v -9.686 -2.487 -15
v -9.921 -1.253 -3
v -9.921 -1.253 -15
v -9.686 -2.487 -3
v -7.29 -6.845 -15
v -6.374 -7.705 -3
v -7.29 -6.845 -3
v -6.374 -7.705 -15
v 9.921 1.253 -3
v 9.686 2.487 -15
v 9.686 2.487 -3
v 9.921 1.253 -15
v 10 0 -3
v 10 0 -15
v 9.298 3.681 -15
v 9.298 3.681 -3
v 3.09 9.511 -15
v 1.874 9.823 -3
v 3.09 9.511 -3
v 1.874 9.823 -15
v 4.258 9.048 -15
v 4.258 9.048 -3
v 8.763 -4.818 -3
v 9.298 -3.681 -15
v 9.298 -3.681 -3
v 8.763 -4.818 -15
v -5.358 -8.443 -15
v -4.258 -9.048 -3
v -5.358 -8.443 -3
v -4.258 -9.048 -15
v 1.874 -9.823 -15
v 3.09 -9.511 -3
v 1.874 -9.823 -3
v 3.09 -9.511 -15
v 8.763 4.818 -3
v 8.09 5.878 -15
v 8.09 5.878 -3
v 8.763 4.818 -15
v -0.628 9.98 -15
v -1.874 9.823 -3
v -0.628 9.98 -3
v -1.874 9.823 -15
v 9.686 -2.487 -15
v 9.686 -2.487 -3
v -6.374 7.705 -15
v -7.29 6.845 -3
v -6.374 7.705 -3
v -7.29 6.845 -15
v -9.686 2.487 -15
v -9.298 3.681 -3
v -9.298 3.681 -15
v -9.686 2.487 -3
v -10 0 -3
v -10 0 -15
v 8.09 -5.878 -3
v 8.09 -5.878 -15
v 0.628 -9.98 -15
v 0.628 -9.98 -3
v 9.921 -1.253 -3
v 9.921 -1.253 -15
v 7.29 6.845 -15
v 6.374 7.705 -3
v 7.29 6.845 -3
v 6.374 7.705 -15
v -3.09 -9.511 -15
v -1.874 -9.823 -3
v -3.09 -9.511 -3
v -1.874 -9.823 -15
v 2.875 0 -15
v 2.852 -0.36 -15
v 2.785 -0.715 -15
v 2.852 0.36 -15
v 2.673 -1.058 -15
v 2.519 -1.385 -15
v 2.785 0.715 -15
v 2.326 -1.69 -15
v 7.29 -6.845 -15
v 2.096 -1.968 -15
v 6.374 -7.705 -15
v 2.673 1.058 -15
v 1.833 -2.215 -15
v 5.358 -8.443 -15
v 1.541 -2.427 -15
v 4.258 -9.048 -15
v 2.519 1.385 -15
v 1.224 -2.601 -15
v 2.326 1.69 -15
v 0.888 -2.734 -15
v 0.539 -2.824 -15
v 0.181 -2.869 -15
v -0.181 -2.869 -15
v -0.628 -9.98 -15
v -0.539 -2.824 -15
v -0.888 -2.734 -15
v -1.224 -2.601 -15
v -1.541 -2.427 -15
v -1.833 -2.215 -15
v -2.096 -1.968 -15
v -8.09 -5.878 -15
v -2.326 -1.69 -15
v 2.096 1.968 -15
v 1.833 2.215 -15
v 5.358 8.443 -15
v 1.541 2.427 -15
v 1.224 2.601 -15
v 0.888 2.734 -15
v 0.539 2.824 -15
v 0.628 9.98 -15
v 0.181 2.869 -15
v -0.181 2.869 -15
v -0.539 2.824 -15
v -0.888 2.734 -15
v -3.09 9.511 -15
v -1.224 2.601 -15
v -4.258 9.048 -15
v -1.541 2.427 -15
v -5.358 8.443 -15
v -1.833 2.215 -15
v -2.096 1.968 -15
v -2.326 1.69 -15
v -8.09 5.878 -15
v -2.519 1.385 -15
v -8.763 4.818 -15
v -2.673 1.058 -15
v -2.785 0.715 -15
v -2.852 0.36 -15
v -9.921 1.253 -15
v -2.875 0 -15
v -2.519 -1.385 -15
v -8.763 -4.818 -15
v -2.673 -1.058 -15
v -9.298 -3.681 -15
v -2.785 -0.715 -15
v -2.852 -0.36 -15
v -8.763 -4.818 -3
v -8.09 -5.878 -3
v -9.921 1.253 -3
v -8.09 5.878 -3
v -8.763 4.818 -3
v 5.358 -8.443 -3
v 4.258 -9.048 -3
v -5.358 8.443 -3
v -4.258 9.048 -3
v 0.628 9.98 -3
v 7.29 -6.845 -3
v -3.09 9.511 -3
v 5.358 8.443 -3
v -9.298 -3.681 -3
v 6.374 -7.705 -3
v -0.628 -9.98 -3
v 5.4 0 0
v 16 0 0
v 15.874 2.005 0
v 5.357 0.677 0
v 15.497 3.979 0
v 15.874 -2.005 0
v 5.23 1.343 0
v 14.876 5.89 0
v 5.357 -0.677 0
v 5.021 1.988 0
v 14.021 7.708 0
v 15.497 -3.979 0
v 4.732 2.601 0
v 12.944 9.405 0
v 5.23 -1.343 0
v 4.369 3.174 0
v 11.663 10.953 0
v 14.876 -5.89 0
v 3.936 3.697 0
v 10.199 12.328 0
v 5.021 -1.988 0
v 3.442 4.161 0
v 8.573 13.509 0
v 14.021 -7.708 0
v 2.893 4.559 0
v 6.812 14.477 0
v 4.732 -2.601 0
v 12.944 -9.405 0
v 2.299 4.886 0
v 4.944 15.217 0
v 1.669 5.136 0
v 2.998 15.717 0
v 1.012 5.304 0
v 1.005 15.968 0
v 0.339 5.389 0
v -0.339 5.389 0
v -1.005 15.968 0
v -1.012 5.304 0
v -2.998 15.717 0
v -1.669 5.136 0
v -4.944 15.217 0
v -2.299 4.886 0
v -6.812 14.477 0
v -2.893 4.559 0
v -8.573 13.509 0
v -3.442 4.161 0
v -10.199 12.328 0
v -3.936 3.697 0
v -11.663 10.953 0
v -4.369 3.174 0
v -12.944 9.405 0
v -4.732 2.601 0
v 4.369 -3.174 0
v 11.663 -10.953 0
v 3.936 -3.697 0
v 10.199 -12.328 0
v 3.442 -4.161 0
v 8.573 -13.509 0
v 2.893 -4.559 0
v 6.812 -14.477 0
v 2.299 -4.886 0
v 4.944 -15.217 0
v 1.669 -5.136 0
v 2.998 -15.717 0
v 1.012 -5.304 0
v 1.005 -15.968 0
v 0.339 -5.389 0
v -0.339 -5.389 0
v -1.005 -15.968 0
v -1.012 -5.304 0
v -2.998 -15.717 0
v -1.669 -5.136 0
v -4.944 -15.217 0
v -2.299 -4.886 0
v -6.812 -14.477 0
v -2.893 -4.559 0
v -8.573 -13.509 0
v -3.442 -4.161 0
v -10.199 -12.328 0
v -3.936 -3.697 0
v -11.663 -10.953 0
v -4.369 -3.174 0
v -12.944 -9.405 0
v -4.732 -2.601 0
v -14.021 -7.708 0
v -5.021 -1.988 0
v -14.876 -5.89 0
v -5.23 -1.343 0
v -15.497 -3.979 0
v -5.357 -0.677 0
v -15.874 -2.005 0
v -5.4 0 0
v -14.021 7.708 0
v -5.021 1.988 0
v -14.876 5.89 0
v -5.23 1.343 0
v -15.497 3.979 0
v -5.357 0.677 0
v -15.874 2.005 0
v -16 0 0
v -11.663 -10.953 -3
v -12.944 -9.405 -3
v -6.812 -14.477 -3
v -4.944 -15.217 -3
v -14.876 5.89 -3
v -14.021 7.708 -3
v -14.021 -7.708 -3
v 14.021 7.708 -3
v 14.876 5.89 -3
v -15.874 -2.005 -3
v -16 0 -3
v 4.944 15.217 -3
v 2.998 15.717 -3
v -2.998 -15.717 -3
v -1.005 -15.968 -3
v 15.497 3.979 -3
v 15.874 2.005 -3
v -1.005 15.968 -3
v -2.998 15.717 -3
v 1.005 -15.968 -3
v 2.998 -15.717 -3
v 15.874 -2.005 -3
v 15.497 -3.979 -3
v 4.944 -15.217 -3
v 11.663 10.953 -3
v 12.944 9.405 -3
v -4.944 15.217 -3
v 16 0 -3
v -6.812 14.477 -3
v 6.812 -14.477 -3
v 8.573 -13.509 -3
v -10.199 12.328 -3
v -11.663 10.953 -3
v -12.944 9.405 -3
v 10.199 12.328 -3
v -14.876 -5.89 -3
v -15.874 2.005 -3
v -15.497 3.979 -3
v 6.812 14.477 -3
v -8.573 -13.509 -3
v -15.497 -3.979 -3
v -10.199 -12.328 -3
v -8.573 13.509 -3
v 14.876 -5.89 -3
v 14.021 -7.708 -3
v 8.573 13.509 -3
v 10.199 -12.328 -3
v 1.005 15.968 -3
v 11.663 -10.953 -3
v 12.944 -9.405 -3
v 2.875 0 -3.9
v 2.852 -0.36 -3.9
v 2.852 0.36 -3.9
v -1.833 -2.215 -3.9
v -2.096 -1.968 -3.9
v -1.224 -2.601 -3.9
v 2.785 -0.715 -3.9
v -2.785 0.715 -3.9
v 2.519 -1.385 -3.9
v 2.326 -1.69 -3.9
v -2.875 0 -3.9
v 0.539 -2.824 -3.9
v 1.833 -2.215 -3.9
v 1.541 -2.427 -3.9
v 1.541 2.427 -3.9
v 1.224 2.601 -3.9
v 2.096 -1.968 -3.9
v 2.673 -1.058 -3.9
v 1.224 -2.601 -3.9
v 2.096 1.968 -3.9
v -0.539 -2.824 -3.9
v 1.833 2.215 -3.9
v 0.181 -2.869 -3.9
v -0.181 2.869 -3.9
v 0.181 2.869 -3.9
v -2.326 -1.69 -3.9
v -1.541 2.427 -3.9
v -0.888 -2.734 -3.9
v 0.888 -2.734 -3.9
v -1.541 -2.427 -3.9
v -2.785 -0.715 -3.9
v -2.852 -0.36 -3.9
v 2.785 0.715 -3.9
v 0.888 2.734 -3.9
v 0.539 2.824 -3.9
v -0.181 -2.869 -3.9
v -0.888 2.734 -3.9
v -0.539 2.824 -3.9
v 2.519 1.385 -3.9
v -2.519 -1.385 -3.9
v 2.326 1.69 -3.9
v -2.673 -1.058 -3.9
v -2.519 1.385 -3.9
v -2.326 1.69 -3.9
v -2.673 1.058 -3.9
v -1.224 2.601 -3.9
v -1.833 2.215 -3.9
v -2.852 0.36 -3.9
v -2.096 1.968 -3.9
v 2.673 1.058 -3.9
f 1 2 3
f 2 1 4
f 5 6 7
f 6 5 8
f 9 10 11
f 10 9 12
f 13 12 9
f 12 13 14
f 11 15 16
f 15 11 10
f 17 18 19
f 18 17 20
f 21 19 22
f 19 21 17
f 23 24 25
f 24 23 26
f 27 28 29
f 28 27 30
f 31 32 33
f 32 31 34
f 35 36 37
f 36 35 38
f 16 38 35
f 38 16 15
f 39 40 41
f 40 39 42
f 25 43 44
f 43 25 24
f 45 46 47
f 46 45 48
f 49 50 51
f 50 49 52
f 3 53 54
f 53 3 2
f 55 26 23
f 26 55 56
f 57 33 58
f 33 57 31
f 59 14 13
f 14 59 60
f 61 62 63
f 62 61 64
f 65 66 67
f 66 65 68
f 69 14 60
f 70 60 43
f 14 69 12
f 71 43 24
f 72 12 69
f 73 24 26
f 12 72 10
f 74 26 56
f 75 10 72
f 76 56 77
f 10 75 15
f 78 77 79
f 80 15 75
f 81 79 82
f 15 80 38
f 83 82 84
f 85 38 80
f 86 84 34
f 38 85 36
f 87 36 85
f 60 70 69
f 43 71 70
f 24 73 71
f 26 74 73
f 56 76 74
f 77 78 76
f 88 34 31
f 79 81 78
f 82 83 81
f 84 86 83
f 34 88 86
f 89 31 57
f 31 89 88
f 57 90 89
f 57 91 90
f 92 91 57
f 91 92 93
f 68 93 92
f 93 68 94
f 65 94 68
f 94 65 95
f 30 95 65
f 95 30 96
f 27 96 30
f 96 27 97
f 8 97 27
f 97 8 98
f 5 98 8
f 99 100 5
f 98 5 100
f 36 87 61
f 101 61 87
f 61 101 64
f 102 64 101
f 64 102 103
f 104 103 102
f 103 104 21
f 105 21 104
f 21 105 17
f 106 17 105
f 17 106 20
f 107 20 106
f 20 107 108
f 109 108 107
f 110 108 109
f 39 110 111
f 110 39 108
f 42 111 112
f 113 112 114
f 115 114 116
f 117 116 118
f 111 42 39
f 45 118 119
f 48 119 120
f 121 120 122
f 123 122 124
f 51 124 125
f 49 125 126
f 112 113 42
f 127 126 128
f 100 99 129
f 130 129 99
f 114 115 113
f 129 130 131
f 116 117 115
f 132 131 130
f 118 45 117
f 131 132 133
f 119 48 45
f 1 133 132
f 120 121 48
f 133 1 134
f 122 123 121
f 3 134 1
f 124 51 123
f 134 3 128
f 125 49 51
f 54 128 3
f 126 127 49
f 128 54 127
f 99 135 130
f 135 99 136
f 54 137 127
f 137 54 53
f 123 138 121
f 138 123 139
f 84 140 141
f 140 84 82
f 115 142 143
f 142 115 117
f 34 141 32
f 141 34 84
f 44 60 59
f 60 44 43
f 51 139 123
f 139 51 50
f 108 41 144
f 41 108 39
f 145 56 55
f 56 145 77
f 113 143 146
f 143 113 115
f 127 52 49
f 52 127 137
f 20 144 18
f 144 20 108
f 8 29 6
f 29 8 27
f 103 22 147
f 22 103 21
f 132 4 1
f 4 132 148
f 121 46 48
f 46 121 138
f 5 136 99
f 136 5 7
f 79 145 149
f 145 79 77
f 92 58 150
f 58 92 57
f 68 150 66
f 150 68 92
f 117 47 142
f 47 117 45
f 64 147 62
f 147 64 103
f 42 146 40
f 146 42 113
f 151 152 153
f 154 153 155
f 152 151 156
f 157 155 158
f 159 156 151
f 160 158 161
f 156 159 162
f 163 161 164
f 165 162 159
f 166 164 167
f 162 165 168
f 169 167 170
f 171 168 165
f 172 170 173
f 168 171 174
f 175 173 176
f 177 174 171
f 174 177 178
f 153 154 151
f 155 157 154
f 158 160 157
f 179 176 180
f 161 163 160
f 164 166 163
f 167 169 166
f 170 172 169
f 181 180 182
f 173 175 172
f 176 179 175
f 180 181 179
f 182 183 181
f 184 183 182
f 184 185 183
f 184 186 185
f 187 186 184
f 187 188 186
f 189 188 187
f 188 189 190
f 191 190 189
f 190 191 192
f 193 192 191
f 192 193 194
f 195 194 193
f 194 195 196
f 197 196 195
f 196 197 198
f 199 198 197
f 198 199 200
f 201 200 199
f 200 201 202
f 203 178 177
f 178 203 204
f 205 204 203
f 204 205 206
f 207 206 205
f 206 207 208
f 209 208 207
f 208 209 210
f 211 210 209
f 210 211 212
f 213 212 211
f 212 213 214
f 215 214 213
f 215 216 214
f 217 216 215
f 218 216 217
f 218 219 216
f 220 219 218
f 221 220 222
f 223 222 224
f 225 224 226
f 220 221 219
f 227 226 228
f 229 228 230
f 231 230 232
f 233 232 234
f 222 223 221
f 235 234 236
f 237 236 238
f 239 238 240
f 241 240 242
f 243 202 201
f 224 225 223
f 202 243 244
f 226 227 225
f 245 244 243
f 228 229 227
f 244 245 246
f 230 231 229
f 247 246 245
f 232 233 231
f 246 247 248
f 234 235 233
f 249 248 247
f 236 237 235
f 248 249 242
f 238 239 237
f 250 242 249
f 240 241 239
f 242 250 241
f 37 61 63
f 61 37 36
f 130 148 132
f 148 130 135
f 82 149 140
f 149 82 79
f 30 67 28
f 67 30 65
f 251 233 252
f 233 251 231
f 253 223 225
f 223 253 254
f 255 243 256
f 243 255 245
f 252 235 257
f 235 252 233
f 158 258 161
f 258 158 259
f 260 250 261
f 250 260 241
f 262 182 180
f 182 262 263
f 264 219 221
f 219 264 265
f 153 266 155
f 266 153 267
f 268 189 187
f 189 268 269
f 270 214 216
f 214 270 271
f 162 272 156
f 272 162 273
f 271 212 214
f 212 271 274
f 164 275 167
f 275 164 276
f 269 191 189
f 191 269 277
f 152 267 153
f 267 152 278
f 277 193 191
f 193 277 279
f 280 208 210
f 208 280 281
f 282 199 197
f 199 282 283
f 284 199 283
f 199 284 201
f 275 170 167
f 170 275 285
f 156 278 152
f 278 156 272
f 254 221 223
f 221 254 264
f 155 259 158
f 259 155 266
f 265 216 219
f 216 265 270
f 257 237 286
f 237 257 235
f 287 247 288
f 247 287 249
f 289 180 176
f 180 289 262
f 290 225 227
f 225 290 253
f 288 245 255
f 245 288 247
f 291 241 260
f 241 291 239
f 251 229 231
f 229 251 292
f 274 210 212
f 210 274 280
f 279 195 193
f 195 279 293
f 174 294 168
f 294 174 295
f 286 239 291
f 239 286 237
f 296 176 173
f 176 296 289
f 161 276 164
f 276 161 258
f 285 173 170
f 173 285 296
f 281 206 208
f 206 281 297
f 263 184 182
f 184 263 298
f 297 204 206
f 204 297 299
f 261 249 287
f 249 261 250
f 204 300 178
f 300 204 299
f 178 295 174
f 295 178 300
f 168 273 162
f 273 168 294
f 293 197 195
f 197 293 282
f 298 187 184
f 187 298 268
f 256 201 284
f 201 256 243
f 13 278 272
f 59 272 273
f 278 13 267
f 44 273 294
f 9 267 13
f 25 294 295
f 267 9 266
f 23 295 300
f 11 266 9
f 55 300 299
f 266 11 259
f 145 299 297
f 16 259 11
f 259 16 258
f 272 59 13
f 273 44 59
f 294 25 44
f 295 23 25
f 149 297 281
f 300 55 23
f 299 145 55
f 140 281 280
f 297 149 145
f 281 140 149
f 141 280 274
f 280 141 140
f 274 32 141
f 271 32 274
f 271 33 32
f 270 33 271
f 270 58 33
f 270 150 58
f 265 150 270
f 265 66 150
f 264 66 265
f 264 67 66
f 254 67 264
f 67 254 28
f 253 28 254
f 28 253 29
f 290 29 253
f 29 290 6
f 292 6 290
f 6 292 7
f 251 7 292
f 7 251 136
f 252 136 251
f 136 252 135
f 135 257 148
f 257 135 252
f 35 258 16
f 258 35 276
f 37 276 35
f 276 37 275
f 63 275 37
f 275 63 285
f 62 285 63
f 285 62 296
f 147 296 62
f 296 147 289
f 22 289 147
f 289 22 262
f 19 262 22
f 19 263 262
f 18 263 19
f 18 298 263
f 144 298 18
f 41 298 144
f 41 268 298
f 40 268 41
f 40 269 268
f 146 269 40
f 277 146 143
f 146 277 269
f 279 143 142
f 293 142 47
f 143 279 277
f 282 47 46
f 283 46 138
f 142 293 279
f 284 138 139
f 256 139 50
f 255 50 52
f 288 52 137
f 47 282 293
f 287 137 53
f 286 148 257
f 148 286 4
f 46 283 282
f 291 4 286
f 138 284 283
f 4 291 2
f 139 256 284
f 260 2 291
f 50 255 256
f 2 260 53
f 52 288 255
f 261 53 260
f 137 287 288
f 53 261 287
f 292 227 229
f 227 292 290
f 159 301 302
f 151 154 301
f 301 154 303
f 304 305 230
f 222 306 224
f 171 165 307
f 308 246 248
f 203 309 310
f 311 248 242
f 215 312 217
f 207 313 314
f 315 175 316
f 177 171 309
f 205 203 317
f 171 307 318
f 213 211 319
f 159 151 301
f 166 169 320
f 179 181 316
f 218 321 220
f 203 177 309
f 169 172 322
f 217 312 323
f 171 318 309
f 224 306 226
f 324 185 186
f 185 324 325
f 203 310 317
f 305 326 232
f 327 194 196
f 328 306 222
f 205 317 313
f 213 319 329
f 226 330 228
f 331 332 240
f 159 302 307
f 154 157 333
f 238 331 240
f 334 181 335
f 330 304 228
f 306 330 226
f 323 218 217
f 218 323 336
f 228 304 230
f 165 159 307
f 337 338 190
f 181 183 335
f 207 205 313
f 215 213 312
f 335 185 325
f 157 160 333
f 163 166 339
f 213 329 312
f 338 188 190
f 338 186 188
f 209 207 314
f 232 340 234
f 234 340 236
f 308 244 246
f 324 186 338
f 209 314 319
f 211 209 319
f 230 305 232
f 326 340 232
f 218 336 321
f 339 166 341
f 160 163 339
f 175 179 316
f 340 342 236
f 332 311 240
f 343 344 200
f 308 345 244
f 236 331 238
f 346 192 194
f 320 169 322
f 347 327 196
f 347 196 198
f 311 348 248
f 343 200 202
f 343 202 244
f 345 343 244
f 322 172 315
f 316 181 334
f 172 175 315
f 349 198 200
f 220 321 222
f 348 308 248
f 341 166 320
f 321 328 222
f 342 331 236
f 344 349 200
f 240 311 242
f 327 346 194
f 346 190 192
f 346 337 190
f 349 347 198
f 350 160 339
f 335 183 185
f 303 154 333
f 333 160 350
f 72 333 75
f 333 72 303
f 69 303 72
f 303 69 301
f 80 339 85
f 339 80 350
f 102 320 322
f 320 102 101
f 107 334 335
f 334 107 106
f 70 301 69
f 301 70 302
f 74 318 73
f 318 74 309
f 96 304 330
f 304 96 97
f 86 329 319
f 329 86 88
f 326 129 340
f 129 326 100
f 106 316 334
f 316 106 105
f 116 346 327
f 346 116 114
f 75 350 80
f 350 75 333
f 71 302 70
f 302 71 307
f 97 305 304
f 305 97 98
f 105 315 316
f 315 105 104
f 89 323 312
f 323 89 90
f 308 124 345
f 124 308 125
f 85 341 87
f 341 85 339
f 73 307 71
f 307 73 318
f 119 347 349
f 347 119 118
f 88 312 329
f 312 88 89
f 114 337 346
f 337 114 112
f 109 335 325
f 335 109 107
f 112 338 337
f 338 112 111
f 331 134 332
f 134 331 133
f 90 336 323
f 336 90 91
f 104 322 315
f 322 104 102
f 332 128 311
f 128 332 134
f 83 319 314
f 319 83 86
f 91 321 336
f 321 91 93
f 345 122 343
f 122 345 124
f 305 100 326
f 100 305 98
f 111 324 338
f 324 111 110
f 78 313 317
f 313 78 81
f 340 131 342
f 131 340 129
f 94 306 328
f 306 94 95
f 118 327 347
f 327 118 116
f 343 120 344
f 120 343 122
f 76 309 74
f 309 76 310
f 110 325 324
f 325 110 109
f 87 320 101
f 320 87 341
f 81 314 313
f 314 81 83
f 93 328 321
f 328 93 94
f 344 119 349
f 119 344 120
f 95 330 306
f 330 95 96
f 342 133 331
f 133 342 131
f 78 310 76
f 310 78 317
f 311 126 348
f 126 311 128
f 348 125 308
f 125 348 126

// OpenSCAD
$fn = 50;


difference() {
	union() {
		translate(v = [0, 0, -15.0000000000]) {
			cylinder(h = 15, r = 10.0000000000);
		}
		translate(v = [0, 0, -3.0000000000]) {
			cylinder(h = 3, r = 16.0000000000);
		}
	}
	union() {
		translate(v = [0, 0, 0]) {
			rotate(a = [0, 0, 0]) {
				difference() {
					union() {
						#translate(v = [0, 0, -15.0000000000]) {
							cylinder(h = 15, r = 2.6000000000);
						}
						#translate(v = [0, 0, -3.9000000000]) {
							cylinder(h = 3.9000000000, r1 = 2.8750000000, r2 = 5.4000000000);
						}
						#translate(v = [0, 0, -15.0000000000]) {
							cylinder(h = 15, r = 2.8750000000);
						}
						#translate(v = [0, 0, -15.0000000000]) {
							cylinder(h = 15, r = 2.6000000000);
						}
					}
					union();
				}
			}
		}
	}
}
